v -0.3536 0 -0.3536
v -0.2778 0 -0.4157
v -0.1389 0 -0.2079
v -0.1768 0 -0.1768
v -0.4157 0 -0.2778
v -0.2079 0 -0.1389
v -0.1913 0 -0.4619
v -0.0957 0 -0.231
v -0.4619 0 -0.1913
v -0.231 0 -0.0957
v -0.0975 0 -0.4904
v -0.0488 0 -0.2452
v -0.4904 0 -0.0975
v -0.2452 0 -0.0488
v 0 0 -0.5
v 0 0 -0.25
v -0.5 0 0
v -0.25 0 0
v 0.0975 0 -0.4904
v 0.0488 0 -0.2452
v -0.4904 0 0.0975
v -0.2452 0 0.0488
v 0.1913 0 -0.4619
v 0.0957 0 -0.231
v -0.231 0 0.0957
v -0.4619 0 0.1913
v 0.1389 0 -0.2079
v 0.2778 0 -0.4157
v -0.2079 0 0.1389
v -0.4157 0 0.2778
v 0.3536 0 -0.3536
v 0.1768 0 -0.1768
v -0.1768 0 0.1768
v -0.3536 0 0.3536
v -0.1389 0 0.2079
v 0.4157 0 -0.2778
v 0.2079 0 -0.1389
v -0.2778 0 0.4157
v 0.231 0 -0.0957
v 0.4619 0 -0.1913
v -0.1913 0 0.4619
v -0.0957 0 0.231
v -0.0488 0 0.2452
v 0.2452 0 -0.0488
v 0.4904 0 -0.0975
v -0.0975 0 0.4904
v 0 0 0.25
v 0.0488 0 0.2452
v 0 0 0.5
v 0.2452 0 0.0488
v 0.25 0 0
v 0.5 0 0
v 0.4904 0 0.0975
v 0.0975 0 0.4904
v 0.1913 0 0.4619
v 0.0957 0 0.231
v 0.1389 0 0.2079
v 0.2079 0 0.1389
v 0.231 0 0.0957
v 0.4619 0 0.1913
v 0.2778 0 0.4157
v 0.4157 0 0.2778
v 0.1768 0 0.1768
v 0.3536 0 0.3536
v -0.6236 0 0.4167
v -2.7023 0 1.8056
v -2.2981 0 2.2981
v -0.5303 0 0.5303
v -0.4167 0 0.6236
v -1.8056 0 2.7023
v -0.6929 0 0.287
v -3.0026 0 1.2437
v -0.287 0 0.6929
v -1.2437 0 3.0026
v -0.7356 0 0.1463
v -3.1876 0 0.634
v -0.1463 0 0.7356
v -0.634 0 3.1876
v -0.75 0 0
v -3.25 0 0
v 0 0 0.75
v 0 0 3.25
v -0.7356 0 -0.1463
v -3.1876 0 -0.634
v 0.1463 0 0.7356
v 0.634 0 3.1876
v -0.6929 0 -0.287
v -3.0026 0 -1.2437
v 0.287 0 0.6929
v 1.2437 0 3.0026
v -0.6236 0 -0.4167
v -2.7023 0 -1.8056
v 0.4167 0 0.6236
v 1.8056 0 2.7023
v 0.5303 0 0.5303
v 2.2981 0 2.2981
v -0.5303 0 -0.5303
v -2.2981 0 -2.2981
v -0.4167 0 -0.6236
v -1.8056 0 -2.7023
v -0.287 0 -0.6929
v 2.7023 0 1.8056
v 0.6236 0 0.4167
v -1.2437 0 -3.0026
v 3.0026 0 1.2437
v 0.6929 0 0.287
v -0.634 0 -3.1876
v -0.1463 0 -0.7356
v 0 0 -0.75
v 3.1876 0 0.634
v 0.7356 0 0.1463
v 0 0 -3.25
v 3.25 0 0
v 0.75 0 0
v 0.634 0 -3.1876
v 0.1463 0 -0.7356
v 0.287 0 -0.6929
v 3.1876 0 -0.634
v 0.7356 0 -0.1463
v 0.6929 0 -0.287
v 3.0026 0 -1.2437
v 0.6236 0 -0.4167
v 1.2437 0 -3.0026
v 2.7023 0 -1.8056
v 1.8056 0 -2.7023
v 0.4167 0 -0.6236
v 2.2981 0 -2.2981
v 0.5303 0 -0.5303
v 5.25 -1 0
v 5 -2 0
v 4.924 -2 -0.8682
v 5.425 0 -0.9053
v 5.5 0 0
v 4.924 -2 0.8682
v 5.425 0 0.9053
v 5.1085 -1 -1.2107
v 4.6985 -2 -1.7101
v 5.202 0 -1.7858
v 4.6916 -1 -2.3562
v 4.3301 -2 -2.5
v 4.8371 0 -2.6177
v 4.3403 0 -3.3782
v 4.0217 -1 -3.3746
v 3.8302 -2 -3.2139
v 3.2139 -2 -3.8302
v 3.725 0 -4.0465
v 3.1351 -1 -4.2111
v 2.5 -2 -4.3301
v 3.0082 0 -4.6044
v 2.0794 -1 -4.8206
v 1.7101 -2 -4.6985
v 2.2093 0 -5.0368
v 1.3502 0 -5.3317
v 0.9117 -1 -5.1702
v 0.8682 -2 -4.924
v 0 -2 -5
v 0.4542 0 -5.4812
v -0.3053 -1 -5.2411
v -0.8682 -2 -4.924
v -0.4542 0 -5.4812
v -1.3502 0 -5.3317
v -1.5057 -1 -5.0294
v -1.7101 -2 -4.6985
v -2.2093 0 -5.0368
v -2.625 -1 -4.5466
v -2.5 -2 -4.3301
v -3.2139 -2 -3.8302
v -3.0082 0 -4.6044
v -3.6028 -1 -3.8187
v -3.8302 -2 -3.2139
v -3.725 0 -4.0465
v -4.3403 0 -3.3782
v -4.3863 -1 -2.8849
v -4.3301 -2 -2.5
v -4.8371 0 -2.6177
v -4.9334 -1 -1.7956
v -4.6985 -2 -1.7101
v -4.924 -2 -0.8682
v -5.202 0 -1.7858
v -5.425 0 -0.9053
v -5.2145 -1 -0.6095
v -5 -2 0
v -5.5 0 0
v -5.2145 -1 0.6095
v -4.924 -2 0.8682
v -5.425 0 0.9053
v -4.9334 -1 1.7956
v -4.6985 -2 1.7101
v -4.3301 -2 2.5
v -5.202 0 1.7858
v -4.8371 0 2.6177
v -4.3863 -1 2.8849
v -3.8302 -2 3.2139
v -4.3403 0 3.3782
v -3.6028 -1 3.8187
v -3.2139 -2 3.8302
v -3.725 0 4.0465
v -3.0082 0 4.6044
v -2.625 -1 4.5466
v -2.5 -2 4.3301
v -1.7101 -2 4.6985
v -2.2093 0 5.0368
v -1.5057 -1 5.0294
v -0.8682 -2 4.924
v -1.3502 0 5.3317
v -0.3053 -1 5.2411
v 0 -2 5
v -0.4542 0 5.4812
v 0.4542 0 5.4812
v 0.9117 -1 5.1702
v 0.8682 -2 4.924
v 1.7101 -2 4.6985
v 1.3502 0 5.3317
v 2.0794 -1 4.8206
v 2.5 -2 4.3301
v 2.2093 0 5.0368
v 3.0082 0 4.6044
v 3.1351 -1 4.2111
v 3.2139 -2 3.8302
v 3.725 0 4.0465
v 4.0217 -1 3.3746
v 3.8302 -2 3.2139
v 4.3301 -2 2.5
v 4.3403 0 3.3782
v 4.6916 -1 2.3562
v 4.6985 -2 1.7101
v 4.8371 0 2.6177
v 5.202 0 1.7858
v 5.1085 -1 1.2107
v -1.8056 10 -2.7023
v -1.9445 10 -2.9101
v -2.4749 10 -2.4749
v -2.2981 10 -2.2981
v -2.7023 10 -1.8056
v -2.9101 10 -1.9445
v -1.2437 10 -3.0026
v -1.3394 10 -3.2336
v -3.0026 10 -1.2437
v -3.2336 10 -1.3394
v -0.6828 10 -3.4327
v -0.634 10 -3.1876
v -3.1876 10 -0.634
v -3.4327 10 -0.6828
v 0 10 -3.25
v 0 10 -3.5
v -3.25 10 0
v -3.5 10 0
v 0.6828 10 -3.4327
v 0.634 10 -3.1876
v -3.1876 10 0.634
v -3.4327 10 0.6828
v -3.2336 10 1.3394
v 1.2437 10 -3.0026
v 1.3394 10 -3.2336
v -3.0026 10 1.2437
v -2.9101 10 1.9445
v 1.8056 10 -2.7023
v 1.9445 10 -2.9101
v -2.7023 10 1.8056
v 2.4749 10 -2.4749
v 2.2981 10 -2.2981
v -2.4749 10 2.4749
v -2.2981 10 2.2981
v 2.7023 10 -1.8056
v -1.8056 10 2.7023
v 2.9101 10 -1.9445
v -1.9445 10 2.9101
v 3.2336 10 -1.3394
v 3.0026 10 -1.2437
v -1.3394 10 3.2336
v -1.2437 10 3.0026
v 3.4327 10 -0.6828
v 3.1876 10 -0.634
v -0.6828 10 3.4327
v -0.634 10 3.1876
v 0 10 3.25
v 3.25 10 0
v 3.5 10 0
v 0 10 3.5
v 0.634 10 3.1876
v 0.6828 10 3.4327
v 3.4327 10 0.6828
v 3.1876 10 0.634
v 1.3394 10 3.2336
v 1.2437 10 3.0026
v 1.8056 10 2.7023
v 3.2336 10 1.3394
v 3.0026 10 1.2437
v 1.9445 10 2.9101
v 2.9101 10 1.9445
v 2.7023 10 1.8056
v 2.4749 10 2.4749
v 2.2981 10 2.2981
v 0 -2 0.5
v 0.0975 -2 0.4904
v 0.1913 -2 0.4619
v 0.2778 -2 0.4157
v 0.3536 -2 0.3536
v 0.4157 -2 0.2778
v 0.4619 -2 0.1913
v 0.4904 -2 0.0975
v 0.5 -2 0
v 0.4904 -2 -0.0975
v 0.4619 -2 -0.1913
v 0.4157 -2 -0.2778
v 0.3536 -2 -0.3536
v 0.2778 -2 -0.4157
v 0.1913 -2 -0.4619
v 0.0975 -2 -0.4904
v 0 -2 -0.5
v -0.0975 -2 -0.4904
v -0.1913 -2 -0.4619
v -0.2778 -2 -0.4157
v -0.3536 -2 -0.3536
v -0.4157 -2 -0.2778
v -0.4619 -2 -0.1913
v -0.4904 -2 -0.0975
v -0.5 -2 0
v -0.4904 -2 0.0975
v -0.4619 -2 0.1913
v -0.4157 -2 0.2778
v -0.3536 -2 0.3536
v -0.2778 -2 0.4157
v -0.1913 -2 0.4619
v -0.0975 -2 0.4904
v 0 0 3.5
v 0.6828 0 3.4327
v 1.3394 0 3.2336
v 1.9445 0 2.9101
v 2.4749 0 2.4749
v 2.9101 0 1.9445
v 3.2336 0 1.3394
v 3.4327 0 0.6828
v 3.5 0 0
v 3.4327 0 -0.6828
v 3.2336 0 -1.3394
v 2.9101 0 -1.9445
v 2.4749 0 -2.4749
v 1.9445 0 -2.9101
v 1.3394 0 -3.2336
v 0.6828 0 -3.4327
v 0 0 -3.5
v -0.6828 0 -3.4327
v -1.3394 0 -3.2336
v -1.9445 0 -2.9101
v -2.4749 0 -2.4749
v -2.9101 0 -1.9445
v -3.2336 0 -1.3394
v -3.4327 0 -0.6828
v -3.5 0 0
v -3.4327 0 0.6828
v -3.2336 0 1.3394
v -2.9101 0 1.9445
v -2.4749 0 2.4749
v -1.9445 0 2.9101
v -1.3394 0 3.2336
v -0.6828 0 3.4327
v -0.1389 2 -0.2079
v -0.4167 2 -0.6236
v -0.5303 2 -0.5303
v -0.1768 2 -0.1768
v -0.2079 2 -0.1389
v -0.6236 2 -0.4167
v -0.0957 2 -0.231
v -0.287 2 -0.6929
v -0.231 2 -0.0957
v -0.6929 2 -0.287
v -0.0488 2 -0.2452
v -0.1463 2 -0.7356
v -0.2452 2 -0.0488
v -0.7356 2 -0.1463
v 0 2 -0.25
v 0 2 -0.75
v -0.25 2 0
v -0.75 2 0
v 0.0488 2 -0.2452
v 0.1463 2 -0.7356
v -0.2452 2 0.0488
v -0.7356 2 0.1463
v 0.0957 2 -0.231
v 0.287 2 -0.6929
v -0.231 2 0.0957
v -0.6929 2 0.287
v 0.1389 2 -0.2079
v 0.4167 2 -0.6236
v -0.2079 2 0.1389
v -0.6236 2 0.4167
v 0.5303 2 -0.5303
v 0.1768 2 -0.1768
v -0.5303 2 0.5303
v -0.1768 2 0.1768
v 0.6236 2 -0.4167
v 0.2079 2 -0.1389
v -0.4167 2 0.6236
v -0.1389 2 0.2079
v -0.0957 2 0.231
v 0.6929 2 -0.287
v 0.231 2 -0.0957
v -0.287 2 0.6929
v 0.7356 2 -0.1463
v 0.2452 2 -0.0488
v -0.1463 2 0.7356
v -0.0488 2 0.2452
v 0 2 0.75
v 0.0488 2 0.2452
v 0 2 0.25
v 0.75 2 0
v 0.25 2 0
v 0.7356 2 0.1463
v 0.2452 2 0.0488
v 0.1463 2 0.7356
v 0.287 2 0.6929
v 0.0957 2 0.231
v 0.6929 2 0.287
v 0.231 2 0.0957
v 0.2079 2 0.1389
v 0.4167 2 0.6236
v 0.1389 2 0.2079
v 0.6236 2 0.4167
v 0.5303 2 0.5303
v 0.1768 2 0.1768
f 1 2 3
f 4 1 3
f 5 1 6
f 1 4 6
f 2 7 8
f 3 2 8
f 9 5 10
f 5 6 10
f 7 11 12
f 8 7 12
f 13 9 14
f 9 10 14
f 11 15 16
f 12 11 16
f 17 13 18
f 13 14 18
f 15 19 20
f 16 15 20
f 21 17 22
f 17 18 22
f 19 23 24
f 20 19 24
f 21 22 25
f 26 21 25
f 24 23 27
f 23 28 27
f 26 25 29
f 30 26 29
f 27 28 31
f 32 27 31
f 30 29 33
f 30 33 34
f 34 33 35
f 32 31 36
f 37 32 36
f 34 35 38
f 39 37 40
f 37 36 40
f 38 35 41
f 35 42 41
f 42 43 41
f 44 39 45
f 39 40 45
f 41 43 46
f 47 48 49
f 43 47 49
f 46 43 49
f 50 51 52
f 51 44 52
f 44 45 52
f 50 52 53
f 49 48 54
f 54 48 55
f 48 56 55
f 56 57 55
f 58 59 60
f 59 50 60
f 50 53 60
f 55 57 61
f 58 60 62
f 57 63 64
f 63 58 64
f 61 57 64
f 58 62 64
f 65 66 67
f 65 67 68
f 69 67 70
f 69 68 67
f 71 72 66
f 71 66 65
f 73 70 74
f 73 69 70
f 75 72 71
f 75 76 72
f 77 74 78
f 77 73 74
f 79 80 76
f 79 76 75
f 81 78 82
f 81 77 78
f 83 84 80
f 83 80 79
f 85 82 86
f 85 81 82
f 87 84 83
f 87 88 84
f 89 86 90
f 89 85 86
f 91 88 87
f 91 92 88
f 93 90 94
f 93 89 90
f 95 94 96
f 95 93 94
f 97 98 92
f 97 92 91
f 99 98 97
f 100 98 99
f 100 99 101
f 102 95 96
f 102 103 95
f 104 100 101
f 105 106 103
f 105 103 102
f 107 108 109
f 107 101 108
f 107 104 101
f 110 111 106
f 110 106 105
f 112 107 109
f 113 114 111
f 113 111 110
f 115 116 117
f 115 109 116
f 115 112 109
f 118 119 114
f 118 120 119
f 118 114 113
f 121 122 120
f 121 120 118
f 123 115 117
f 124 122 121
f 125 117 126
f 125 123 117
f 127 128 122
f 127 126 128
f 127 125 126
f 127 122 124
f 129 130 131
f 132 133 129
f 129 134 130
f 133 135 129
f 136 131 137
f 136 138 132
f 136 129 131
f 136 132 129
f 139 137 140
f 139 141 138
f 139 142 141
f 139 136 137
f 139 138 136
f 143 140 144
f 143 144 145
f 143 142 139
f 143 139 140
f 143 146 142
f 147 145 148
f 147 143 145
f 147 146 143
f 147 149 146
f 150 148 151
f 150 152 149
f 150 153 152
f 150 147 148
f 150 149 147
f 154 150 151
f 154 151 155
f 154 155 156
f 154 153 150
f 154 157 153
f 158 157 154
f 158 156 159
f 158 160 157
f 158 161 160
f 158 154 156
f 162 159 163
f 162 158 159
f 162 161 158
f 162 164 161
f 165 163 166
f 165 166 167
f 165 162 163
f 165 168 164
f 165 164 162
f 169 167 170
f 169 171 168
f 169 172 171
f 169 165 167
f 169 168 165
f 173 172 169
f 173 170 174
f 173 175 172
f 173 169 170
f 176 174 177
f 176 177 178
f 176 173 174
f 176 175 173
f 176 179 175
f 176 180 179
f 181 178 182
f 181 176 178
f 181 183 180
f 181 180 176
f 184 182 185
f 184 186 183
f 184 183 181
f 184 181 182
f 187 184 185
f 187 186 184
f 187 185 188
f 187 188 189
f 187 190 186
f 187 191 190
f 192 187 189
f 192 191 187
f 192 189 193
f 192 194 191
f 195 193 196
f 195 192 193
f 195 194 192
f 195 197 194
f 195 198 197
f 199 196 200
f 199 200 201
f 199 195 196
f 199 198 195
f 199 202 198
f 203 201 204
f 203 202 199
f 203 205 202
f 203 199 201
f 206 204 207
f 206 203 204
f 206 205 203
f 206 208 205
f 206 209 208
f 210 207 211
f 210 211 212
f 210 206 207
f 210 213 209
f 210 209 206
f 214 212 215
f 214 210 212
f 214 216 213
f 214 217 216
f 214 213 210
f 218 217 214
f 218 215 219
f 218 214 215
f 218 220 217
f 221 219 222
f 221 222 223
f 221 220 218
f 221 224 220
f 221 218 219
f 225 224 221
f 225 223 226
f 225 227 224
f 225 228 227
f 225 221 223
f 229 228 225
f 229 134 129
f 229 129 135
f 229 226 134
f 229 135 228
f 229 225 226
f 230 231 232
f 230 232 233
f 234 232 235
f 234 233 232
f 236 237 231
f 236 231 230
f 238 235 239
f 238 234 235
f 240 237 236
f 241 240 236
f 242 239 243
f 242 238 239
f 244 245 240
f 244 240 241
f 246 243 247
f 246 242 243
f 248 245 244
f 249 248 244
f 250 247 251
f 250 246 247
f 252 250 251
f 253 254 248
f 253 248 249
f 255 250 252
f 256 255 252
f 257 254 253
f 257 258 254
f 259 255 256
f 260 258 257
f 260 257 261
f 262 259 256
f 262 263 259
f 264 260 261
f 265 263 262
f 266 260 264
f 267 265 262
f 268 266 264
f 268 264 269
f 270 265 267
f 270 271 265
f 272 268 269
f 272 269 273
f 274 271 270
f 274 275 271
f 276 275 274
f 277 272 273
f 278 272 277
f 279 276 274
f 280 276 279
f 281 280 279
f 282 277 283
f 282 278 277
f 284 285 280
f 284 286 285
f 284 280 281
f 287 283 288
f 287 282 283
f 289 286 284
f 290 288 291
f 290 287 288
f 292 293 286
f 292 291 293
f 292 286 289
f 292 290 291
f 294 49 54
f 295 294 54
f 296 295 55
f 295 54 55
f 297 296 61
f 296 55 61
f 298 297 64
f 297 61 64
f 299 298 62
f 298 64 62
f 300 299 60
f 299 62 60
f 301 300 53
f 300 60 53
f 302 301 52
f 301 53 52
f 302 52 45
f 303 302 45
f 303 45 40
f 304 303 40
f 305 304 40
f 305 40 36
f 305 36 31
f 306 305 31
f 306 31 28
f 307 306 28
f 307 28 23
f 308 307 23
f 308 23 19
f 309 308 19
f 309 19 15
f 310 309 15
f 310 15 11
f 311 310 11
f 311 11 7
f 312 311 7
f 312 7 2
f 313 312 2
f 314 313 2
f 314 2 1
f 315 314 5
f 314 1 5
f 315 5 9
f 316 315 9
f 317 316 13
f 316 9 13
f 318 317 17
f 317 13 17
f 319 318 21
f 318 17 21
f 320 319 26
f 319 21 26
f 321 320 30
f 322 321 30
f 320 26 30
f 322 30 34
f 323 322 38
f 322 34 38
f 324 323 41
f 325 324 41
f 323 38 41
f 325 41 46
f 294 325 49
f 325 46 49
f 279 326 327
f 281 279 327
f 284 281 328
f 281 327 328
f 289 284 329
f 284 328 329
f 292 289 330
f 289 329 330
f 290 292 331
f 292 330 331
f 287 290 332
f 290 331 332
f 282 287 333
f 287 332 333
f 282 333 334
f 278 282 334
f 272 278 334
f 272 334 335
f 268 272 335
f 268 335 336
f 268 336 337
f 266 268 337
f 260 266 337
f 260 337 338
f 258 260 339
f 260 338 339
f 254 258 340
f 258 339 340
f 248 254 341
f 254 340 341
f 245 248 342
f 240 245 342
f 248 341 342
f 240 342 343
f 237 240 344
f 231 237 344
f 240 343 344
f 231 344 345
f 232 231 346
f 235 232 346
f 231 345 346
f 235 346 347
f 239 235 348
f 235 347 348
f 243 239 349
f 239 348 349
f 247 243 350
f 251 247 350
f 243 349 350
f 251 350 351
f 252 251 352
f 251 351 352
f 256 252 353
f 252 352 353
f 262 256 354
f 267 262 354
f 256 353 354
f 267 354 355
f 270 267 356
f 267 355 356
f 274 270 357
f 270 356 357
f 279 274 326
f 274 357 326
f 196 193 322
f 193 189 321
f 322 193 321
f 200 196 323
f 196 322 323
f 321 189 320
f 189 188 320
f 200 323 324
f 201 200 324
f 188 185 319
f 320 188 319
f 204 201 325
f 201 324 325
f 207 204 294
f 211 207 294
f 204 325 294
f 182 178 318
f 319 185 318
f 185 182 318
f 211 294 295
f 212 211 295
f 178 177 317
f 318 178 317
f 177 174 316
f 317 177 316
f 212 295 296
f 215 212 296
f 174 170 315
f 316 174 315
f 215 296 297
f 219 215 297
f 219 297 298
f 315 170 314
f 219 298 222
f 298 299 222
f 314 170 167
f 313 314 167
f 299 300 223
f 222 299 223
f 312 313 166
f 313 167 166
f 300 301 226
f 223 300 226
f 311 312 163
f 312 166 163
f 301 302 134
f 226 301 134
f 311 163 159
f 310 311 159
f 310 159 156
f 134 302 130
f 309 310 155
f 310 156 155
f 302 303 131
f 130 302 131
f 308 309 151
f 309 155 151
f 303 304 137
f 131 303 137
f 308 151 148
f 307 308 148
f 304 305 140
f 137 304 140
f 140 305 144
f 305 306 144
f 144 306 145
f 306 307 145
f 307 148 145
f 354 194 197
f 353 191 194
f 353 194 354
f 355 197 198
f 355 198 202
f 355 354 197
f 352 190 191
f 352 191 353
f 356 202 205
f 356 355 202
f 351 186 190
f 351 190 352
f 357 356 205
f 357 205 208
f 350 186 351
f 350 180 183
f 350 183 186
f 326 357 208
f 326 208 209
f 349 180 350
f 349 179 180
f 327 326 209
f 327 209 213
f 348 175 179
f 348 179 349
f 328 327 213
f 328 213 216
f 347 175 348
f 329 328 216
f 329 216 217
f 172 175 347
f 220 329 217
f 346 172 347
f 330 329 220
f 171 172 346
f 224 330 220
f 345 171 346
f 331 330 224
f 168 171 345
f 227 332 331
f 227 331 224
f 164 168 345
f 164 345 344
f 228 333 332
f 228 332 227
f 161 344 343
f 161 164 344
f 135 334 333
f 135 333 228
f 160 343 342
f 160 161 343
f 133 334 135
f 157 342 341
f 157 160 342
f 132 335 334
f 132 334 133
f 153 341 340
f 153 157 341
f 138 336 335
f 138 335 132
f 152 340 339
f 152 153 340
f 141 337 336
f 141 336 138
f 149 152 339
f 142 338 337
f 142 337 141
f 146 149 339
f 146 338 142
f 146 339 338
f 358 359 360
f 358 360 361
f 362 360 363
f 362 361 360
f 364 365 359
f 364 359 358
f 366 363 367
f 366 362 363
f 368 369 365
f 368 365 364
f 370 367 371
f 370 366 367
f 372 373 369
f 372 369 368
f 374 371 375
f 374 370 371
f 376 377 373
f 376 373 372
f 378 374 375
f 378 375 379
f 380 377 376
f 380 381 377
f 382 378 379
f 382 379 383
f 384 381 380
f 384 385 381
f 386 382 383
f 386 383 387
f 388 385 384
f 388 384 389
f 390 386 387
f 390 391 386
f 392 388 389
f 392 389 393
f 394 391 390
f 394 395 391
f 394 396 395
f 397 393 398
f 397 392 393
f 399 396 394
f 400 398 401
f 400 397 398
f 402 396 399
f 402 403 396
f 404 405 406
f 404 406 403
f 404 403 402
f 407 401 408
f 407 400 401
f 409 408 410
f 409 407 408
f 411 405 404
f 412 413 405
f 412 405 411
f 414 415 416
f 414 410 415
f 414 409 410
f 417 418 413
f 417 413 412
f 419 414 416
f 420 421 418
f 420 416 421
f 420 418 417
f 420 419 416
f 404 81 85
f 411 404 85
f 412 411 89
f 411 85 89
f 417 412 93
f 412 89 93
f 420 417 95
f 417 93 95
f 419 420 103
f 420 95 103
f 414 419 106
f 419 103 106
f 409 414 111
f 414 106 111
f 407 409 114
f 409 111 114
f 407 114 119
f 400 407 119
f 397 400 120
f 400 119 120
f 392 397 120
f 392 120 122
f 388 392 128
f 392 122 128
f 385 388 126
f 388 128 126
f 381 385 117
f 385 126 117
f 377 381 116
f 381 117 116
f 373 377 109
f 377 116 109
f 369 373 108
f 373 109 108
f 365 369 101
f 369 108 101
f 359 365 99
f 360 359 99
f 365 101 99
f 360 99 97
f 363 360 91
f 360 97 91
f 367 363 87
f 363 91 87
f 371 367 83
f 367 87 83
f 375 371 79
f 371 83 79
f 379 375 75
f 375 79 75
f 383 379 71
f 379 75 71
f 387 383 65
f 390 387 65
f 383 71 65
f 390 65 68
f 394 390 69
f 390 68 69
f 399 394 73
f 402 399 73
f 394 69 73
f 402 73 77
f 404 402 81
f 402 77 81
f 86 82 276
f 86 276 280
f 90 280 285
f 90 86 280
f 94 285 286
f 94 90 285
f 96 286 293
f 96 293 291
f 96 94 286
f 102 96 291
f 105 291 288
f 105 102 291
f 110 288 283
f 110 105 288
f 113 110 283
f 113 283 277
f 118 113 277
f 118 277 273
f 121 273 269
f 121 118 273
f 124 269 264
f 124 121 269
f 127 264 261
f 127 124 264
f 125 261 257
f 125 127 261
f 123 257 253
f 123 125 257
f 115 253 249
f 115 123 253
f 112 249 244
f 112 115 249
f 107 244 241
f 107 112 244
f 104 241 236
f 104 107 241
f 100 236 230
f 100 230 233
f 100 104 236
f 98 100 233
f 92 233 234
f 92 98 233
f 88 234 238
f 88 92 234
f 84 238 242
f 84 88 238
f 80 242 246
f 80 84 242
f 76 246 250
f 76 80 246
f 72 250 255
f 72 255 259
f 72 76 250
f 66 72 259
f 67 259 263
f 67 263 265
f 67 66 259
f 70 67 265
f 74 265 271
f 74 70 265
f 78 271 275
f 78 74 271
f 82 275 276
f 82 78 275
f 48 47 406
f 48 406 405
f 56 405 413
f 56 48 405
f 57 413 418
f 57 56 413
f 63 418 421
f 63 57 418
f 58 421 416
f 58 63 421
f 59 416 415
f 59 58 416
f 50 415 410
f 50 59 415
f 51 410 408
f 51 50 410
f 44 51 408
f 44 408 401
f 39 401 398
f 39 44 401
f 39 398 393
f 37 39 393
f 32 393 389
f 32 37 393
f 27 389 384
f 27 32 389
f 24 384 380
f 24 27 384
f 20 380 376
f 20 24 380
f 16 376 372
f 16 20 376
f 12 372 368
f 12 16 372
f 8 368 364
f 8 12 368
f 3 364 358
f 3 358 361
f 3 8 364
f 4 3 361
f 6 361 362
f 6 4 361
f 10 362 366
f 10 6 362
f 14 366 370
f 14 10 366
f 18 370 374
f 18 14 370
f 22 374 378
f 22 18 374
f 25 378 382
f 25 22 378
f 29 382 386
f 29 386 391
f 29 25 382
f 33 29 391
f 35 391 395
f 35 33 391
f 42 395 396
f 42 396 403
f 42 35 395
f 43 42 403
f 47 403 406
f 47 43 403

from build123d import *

# Parameters (mm, degrees)
SKETCH2_R           = 5
SKETCH1_R           = 5.5
SKETCH3_R           = 0.5
CUT_EXTRUDE1_DEPTH  = 9.031189364
SKETCH4_R           = 3.5
SKETCH4_R_2         = 3.25
BOSS_EXTRUDE1_DEPTH = 10
SKETCH5_R           = 0.75
SKETCH5_R_2         = 0.25
BOSS_EXTRUDE2_DEPTH = 2


with BuildPart() as part:
    # Sketch2 → Loft1 section 0
    with BuildSketch(Plane(origin=(0, -2, 0), x_dir=(1, 0, 0), z_dir=(0, 1, 0))):
        Circle(SKETCH2_R)
    # Sketch1 → Loft1 section 1
    with BuildSketch(Plane(origin=(0, 0, 0), x_dir=(1, 0, 0), z_dir=(0, 1, 0))):
        Circle(SKETCH1_R)
    loft()

    # Sketch3 → Cut-Extrude1 (cut, through all)
    with BuildSketch(Plane(origin=(0, 0, 0), x_dir=(1, 0, 0), z_dir=(0, 1, 0))):
        with Locations(Location((0, 0, 0), (0, 0, 270))):
            Circle(SKETCH3_R)
    extrude(amount=-CUT_EXTRUDE1_DEPTH, mode=Mode.SUBTRACT)

    # Sketch4 → Boss-Extrude1 (add)
    with BuildSketch(Plane(origin=(0, 0, 0), x_dir=(1, 0, 0), z_dir=(0, 1, 0))):
        with Locations(Location((0, 0, 0), (0, 0, 270))):
            Circle(SKETCH4_R)
        with Locations(Location((0, 0, 0), (0, 0, 270))):
            Circle(SKETCH4_R_2, mode=Mode.SUBTRACT)
    extrude(amount=BOSS_EXTRUDE1_DEPTH)

    # Sketch5 → Boss-Extrude2 (add)
    with BuildSketch(Plane(origin=(0, 0, 0), x_dir=(1, 0, 0), z_dir=(0, 1, 0))):
        with Locations(Location((0, 0, 0), (0, 0, 270))):
            Circle(SKETCH5_R)
        with Locations(Location((0, 0, 0), (0, 0, 270))):
            Circle(SKETCH5_R_2, mode=Mode.SUBTRACT)
    extrude(amount=BOSS_EXTRUDE2_DEPTH)


solid = part.part
